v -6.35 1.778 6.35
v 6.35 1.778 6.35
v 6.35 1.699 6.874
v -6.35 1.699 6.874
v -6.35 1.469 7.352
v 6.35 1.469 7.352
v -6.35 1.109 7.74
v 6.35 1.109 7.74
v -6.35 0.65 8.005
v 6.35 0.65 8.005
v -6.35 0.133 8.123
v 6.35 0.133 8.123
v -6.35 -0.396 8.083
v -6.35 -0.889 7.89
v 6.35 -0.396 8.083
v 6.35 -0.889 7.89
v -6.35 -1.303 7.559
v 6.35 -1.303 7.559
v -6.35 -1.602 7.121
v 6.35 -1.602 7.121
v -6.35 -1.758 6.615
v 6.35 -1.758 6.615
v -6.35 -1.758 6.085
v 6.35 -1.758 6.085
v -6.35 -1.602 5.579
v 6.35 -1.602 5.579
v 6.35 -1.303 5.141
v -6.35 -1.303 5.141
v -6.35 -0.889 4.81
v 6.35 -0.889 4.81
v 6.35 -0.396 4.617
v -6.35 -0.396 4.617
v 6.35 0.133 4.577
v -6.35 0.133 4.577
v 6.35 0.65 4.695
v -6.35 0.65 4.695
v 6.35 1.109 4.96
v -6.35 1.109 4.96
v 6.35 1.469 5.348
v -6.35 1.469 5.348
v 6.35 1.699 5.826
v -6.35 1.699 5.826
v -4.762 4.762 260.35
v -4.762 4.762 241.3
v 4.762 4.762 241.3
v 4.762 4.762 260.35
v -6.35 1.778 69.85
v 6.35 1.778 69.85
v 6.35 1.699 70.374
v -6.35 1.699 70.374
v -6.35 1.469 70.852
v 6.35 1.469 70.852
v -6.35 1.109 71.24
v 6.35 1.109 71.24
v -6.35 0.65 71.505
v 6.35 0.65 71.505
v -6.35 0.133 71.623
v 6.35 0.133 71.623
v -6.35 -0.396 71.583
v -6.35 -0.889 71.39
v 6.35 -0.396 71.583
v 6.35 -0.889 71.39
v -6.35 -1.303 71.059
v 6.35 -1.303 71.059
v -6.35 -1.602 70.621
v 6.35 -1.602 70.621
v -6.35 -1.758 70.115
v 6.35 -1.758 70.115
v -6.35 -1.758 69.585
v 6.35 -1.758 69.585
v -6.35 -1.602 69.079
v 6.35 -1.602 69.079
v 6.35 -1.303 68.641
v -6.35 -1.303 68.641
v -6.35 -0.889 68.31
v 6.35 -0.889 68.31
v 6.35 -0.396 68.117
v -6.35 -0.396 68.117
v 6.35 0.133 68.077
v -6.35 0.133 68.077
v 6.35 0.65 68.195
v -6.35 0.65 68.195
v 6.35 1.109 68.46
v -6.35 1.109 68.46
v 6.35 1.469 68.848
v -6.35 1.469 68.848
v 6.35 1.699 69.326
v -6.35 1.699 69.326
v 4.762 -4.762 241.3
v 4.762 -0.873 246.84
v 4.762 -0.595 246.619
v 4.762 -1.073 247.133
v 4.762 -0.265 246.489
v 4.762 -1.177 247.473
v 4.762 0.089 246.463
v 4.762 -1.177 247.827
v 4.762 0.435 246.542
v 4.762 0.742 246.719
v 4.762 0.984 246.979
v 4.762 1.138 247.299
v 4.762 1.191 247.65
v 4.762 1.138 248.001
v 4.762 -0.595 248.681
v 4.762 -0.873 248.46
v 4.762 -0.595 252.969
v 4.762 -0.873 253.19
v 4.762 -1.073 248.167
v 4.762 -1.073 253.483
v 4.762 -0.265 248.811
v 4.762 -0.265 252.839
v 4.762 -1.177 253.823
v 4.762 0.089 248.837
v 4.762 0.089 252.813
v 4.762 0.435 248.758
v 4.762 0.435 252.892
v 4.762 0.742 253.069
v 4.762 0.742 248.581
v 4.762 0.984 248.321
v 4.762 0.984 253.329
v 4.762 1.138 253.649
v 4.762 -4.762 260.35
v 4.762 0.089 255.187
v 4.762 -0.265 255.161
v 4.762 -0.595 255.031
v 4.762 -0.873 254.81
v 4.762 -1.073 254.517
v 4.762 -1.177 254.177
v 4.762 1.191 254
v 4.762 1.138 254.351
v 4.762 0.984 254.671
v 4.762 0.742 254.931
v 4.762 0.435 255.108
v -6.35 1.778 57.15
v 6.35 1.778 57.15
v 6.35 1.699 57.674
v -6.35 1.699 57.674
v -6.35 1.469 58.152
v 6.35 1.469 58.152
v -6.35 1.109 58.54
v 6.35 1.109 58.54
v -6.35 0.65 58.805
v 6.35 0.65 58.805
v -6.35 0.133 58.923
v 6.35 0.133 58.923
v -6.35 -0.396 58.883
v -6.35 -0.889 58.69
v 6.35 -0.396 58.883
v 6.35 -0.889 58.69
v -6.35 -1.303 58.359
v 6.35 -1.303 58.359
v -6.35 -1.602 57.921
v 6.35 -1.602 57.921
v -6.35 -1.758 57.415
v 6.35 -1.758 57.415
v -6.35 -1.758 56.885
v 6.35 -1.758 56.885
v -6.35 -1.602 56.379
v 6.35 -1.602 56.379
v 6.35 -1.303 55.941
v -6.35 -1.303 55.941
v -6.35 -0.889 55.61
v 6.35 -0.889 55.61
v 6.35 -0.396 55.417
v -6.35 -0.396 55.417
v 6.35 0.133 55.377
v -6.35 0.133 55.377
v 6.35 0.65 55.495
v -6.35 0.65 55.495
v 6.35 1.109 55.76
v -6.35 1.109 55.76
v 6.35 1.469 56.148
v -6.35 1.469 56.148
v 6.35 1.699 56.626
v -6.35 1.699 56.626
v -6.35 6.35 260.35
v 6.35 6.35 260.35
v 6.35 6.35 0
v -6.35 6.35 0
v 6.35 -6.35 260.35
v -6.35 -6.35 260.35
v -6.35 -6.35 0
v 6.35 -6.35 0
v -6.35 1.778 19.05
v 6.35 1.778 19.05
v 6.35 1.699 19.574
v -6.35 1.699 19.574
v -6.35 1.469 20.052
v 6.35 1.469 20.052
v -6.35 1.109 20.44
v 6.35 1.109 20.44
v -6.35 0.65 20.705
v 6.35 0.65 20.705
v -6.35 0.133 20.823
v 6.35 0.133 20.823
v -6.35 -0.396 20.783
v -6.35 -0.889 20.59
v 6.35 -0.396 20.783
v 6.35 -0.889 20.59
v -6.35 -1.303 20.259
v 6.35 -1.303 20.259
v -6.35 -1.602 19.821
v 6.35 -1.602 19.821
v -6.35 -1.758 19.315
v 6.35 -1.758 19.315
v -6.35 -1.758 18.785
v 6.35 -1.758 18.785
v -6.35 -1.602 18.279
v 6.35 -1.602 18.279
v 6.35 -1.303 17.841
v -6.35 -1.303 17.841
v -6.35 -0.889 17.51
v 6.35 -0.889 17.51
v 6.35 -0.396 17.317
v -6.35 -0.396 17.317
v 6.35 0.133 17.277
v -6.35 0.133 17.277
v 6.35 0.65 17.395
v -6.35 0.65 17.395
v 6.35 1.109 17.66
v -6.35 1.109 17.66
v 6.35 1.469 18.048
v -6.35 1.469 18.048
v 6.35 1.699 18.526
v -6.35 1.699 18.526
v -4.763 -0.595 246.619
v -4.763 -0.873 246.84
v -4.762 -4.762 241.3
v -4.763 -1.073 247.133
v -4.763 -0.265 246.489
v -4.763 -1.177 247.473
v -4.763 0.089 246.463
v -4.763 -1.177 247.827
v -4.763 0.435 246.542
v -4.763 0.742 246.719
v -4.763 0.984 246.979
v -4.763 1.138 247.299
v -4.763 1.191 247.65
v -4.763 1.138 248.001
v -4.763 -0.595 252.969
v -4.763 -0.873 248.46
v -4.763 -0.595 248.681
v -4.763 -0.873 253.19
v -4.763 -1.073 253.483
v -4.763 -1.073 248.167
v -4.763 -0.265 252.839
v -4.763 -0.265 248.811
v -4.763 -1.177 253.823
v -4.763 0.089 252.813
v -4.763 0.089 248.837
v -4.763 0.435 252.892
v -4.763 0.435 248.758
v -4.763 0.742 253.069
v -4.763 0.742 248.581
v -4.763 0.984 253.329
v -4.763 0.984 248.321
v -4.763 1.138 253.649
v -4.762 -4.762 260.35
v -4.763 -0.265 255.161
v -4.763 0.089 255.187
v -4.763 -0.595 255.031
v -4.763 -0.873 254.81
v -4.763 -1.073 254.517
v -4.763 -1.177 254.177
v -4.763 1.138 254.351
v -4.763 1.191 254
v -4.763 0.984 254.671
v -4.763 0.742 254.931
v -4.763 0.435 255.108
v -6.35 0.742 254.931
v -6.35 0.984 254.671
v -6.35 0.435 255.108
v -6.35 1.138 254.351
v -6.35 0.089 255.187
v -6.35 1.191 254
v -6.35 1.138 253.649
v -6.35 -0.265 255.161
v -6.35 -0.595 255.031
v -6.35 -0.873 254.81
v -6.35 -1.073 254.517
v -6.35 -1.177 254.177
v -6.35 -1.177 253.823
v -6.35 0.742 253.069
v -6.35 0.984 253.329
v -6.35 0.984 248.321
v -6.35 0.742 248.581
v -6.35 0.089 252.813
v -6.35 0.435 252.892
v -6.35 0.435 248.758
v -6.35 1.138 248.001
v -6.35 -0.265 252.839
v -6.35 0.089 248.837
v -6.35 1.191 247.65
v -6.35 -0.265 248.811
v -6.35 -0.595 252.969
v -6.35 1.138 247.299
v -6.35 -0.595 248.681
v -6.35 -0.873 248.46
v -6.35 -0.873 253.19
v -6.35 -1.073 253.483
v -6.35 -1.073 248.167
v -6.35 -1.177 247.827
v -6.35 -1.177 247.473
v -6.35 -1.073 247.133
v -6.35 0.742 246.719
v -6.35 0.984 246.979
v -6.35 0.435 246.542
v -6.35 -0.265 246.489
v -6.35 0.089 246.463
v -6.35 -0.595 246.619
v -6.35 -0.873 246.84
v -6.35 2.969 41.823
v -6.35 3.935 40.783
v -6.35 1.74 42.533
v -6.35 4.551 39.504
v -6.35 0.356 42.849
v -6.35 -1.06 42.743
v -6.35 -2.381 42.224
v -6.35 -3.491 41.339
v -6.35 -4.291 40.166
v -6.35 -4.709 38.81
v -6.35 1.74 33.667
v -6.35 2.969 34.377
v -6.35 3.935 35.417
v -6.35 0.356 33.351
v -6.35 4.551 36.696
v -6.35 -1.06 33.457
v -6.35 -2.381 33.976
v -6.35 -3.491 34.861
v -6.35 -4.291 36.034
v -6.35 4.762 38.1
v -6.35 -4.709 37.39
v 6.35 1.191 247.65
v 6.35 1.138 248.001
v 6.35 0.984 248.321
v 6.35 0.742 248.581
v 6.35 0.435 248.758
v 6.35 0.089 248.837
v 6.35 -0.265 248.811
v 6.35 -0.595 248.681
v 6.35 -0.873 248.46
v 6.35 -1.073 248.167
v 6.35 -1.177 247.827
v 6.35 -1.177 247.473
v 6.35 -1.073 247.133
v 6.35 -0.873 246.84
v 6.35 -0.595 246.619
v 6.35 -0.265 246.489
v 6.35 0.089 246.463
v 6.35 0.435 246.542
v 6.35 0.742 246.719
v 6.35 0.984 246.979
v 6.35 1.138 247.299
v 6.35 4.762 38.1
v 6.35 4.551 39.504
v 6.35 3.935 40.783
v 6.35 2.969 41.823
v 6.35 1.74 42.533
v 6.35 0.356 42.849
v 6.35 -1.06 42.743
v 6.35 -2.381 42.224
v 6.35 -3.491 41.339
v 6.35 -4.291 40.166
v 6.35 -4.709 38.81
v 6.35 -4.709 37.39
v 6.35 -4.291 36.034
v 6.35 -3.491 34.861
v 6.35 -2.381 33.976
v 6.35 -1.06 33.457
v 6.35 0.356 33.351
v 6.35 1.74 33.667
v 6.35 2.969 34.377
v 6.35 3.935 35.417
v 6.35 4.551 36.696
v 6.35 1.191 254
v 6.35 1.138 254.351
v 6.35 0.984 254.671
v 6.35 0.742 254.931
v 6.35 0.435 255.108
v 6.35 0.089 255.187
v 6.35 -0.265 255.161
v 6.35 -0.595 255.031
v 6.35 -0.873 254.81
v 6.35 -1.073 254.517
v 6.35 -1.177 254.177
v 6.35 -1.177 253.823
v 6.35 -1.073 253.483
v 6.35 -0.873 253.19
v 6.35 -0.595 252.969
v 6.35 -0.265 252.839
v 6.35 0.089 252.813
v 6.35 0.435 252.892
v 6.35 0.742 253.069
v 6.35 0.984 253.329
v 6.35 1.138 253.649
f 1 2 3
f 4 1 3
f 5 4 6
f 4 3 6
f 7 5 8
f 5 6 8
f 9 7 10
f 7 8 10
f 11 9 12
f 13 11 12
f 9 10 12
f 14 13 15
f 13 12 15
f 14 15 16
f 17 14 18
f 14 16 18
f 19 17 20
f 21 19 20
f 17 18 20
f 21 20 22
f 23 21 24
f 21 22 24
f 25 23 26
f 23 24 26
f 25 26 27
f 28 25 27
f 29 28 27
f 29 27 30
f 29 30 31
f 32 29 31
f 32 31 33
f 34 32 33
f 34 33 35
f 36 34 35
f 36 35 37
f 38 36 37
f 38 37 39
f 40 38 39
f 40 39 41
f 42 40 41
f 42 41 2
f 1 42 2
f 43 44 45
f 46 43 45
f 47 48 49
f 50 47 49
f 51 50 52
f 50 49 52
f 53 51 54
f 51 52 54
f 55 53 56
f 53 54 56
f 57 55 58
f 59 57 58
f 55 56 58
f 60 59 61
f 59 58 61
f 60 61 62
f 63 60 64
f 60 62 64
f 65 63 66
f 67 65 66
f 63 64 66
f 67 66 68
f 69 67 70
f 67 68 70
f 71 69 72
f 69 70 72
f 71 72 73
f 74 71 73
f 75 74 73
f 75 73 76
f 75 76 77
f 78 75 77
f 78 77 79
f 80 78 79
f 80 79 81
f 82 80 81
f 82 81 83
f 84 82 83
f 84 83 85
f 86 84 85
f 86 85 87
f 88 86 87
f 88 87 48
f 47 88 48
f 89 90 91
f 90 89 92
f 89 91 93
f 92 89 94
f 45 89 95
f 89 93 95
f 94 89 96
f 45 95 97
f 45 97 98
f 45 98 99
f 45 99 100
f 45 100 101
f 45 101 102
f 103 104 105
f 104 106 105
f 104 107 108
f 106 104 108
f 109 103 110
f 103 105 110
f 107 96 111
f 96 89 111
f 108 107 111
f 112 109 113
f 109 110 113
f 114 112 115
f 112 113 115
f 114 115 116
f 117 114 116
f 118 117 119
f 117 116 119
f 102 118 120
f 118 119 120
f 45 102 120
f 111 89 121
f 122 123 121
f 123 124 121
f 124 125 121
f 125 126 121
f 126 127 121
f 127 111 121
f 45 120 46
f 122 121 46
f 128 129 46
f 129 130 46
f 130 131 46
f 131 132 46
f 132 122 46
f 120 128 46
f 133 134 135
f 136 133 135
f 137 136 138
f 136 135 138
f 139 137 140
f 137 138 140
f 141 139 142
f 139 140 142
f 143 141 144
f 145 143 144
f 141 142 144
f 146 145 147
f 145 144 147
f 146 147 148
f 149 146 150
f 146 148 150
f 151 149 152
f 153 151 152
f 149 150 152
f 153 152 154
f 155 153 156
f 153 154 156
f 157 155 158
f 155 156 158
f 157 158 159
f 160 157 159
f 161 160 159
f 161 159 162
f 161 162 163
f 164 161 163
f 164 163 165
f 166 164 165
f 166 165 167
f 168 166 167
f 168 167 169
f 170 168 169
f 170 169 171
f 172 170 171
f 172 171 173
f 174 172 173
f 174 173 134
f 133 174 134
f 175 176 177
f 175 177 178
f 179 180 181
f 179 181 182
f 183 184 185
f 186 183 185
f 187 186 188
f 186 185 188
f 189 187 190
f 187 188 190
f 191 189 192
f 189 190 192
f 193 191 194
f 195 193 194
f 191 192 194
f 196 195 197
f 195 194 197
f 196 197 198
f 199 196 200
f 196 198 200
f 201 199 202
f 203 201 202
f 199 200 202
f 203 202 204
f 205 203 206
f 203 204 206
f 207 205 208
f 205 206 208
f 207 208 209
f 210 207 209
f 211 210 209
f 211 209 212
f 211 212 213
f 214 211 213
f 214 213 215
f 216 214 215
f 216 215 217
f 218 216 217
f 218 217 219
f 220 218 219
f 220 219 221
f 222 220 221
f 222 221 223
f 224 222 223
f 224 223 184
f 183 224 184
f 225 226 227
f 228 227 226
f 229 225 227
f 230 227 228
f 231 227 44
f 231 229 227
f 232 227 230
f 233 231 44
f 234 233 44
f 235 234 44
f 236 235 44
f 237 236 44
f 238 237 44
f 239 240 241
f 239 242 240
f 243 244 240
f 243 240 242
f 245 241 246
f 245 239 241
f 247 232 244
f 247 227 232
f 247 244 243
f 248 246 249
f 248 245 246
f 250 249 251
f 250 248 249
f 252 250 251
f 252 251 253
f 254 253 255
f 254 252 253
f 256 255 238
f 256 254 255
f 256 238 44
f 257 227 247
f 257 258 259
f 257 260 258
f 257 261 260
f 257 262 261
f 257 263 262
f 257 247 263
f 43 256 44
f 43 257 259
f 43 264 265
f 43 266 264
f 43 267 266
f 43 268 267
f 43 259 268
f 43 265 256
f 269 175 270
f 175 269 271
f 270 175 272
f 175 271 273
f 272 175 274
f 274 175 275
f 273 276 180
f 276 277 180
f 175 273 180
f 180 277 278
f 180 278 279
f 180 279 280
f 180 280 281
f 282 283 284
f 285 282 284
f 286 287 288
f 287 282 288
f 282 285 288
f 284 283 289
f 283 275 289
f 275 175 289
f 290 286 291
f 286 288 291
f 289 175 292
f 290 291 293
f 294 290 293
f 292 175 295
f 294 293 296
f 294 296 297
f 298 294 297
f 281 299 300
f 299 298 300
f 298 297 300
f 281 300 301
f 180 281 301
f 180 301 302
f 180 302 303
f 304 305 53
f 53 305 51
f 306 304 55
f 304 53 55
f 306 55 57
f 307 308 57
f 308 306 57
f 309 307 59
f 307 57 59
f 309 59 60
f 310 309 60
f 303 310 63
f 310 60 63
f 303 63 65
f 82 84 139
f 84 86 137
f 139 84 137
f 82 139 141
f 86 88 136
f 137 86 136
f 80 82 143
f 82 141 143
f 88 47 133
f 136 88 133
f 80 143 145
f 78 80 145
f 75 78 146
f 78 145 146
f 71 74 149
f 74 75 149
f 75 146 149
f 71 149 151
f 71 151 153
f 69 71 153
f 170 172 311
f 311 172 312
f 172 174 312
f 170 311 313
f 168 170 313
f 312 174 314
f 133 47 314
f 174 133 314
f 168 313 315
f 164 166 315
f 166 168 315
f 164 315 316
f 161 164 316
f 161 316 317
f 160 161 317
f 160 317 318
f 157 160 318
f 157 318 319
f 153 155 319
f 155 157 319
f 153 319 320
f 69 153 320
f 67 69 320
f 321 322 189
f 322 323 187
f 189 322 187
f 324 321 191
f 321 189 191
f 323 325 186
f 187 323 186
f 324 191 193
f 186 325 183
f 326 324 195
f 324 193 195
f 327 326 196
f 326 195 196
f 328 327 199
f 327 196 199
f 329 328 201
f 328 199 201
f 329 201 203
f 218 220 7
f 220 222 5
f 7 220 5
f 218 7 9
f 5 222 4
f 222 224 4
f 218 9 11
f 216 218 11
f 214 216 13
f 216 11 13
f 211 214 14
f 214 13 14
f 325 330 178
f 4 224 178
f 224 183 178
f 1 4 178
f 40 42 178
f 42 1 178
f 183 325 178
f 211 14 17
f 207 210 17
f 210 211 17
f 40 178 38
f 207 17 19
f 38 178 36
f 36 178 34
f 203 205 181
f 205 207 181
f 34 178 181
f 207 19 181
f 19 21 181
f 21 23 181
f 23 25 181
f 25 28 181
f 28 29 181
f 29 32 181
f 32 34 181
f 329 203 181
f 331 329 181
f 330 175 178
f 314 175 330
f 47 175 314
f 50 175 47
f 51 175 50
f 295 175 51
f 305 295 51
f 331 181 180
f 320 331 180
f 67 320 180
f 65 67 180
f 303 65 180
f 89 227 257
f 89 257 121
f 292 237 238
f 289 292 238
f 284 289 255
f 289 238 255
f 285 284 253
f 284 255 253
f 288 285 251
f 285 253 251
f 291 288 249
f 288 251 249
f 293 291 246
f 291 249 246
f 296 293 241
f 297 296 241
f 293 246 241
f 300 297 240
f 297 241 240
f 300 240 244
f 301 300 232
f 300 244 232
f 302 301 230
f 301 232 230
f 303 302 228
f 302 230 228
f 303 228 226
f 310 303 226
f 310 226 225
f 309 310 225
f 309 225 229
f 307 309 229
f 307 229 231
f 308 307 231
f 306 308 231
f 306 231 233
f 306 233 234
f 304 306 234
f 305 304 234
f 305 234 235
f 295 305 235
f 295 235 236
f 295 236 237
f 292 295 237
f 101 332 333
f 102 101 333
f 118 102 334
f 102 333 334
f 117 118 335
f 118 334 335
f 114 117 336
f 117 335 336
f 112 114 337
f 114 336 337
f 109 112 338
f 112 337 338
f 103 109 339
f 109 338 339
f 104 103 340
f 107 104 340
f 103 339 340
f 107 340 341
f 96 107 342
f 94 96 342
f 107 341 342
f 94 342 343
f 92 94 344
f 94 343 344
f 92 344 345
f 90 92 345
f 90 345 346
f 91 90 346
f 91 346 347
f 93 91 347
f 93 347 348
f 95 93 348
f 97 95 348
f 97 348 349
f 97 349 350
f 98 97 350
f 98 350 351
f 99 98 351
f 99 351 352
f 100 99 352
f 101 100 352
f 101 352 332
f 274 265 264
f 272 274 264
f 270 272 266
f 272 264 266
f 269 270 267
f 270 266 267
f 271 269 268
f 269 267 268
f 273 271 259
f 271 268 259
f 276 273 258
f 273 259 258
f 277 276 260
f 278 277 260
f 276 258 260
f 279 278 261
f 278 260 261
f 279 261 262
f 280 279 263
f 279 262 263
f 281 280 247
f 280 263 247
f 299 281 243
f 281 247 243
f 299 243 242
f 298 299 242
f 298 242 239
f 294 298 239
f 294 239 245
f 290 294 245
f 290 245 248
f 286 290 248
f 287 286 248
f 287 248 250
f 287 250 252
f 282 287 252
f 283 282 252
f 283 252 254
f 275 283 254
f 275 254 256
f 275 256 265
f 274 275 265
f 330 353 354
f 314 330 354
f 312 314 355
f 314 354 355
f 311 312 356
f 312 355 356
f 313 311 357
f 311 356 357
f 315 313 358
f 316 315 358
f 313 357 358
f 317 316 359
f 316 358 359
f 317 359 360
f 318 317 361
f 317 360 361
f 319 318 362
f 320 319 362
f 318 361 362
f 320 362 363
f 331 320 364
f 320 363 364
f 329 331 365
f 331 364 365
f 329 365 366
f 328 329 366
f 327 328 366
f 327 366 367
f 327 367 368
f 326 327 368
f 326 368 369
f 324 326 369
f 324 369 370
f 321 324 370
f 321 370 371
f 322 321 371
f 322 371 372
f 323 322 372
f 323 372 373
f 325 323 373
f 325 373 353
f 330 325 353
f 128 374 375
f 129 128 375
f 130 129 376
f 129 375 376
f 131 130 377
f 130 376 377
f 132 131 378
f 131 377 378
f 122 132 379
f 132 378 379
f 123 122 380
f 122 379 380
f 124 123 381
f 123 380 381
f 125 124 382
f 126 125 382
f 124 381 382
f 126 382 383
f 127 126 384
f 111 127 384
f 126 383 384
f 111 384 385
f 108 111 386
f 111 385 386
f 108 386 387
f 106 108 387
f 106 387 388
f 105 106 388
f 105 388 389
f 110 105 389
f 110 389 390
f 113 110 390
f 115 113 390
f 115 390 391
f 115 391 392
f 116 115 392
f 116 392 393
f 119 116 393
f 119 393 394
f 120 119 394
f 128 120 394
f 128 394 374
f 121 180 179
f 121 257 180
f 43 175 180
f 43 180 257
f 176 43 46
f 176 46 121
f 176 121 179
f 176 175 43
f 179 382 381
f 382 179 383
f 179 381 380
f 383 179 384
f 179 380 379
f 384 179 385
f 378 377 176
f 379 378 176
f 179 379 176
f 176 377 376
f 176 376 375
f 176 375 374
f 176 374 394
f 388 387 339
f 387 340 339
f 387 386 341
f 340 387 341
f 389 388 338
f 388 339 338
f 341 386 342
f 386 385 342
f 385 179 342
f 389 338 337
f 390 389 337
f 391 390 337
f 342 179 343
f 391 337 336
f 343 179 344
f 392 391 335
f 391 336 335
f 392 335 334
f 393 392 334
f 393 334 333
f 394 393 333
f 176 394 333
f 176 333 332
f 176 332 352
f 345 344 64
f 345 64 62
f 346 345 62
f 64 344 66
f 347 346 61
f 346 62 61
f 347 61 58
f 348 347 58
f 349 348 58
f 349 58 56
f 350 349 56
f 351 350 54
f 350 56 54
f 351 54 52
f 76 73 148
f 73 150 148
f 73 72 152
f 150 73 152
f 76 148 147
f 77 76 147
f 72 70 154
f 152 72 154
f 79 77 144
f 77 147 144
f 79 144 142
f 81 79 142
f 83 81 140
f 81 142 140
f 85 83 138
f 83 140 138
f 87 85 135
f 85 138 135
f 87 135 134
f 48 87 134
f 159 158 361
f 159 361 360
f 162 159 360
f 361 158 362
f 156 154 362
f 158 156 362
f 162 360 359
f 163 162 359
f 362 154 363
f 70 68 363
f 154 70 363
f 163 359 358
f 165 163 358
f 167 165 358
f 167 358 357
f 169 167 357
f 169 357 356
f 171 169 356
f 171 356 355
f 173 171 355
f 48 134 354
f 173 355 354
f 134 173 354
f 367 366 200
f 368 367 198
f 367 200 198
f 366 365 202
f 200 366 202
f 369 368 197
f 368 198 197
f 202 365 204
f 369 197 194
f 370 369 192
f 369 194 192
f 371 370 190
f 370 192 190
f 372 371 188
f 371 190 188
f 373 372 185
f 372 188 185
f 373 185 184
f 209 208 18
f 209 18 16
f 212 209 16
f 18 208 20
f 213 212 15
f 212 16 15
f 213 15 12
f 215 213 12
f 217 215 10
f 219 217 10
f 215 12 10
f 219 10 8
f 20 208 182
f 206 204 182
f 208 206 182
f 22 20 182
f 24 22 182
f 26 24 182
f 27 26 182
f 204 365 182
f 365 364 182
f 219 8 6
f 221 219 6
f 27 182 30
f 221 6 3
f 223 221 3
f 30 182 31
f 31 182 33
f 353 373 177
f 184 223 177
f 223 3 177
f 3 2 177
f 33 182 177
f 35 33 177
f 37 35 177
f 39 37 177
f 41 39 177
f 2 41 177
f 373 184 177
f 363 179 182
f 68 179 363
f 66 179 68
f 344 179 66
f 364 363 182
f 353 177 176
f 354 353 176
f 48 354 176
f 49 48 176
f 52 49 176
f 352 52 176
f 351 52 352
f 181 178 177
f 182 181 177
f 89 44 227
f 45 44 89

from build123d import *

# Parameters (mm, degrees)
F1_DEPTH = 260.35
F2_R     = 1.190625
F3_DEPTH = 12.701
F4_R     = 1.778
F5_DEPTH = 12.701
F6_W     = 9.525
F6_H     = 9.525
F7_DEPTH = 19.05


with BuildPart() as f1:
    # F0 (on Top) → F1 (new body)
    with BuildSketch(Plane.XY):
        Polygon((-4.7625, -4.7625), (-4.7625, 4.7625), (0, 4.7625), (0, 6.35), (-6.35, 6.35), (-6.35, -6.35), (6.35, -6.35), (6.35, 0), (4.7625, 0), (4.7625, -4.7625), align=None)
        Polygon((0, 6.35), (0, 4.7625), (4.7625, 4.7625), (4.7625, 0), (6.35, 0), (6.35, 6.35), align=None)
        Polygon((0, 4.7625), (-4.7625, 4.7625), (-4.7625, -4.7625), (4.7625, -4.7625), (4.7625, 0), (4.7625, 4.7625), align=None)
    extrude(amount=F1_DEPTH)

    # F2 (on face) → F3 (cut, through all)
    with BuildSketch(Plane.YZ.offset(6.35)):
        with Locations((0, 254)):
            Circle(F2_R)
        with Locations((0, 247.65)):
            Circle(F2_R)
    extrude(amount=-F3_DEPTH, mode=Mode.SUBTRACT)

    # F4 (on face) → F5 (cut, through all)
    with BuildSketch(Plane.YZ.offset(6.35)):
        with BuildLine():
            ThreePointArc((-4.7625, 38.1), (0, 33.3375), (4.7625, 38.1))
            Line((4.7625, 38.1), (-4.7625, 38.1))
        make_face()
        with BuildLine():
            Line((-4.7625, 38.1), (4.7625, 38.1))
            ThreePointArc((4.7625, 38.1), (0, 42.8625), (-4.7625, 38.1))
        make_face()
        with Locations((0, 57.15)):
            Circle(F4_R)
        with Locations((0, 69.85)):
            Circle(F4_R)
        with Locations((0, 19.05)):
            Circle(F4_R)
        with Locations((0, 6.35)):
            Circle(F4_R)
    extrude(amount=-F5_DEPTH, mode=Mode.SUBTRACT)

    # F6 (on face) → F7 (cut)
    with BuildSketch(Plane.XY.offset(260.35)):
        Rectangle(F6_W, F6_H)
    extrude(amount=-F7_DEPTH, mode=Mode.SUBTRACT)


solid = f1.part
